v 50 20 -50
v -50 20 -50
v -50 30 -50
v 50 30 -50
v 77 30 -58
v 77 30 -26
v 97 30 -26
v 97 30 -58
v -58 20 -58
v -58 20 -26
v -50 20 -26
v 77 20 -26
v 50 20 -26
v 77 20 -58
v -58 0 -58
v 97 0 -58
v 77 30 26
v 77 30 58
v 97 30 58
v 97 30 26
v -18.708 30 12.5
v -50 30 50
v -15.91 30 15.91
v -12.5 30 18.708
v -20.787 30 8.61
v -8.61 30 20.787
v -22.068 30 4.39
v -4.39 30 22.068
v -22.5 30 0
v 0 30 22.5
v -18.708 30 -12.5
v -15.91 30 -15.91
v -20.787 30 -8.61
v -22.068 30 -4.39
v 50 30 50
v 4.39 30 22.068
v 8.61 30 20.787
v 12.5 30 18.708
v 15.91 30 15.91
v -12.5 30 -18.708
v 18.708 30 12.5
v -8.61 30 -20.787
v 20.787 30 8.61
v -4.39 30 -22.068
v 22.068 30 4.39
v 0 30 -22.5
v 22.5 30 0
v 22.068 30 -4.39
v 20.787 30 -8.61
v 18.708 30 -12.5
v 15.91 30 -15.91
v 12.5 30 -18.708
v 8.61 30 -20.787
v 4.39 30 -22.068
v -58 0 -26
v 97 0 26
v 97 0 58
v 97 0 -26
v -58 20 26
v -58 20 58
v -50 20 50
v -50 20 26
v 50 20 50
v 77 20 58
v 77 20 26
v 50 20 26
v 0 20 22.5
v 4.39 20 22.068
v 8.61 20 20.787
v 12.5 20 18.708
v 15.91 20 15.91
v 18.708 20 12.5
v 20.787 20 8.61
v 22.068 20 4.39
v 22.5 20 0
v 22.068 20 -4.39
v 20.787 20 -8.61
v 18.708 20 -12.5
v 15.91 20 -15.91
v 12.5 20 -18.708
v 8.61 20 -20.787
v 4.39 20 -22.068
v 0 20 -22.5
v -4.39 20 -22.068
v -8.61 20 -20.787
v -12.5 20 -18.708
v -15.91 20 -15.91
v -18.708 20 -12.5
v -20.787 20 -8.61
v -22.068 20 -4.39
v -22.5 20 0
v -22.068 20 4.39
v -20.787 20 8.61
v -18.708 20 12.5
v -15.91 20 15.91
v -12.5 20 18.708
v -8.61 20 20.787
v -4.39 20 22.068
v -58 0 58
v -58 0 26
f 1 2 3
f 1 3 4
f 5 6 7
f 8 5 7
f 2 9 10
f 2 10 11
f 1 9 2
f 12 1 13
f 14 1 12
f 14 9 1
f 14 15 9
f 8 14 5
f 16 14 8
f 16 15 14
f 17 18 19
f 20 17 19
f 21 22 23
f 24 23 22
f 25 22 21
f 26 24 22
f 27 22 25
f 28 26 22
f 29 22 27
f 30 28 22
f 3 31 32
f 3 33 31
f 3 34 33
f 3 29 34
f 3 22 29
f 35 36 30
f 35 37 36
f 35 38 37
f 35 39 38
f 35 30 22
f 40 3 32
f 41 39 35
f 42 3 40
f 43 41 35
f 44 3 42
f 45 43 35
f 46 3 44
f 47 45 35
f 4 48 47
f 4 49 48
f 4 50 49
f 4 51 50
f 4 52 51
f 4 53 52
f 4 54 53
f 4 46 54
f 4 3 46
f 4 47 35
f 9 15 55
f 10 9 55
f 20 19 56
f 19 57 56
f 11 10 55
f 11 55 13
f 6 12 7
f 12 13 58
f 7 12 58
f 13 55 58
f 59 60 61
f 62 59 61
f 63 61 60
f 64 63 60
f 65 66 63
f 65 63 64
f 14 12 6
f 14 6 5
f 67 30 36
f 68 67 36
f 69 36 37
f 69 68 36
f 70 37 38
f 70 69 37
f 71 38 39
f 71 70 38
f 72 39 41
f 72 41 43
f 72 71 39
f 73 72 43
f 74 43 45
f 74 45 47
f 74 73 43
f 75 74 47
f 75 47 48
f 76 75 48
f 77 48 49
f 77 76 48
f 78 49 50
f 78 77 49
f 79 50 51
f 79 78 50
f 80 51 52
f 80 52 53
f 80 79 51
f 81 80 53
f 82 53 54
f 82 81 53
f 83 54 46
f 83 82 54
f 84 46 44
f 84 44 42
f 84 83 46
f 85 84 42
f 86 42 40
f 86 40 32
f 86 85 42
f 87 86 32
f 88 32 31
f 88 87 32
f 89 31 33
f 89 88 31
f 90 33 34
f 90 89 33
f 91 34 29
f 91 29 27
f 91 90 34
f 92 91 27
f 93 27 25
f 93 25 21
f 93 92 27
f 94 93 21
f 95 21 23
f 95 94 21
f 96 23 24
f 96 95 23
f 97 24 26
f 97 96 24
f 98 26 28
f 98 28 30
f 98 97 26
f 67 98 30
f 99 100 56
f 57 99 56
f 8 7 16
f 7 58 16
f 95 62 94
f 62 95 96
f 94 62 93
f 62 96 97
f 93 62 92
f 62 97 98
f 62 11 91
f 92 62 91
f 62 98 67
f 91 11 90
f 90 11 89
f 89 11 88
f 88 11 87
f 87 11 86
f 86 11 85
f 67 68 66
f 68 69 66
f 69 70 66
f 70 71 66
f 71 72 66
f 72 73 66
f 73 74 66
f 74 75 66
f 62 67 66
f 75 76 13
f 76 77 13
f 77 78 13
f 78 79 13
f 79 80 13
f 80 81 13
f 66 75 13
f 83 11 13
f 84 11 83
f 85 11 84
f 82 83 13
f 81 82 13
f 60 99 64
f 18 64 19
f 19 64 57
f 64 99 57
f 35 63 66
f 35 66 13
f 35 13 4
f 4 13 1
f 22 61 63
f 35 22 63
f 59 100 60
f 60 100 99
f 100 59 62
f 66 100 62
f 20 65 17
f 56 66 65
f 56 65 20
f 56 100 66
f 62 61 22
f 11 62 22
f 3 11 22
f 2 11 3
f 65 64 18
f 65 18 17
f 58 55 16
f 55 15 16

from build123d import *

# Parameters (mm, degrees)
SKETCH1_W           = 20
SKETCH1_H           = 32
SKETCH1_W_2         = 100
SKETCH1_H_2         = 24
BOSS_EXTRUDE1_DEPTH = 20
BOSS_EXTRUDE2_START = 20
SKETCH1_3_W         = 20
SKETCH1_3_H         = 32
BOSS_EXTRUDE2_DEPTH = 10
BOSS_EXTRUDE3_START = 20
SKETCH1_5_W         = 100
SKETCH1_5_H         = 24
SKETCH1_5_H_2       = 52
SKETCH1_5_R         = 22.5
BOSS_EXTRUDE3_DEPTH = 10


with BuildPart() as part:
    # Sketch1 → Boss-Extrude1 (new body)
    with BuildSketch(Plane(origin=(0, 0, 0), x_dir=(1, 0, 0), z_dir=(0, 1, 0))):
        Polygon((50, -50), (-50, -50), (-50, -26), (-58, -26), (-58, -58), (77, -58), (77, -26), (50, -26), align=None)
        Polygon((-58, 26), (-50, 26), (-50, 50), (50, 50), (50, 26), (77, 26), (77, 58), (-58, 58), align=None)
        with Locations((87, -42)):
            Rectangle(SKETCH1_W, SKETCH1_H)
        with Locations((87, 42)):
            Rectangle(SKETCH1_W, SKETCH1_H)
        with Locations((0, -38)):
            Rectangle(SKETCH1_W_2, SKETCH1_H_2)
        with Locations((0, 38)):
            Rectangle(SKETCH1_W_2, SKETCH1_H_2)
    extrude(amount=BOSS_EXTRUDE1_DEPTH)

    # Sketch1<3> → Boss-Extrude2 (add)
    with BuildSketch(Plane(origin=(0, 0, 0), x_dir=(1, 0, 0), z_dir=(0, 1, 0)).offset(BOSS_EXTRUDE2_START)):
        with Locations((87, -42)):
            Rectangle(SKETCH1_3_W, SKETCH1_3_H)
        with Locations((87, 42)):
            Rectangle(SKETCH1_3_W, SKETCH1_3_H)
    extrude(amount=BOSS_EXTRUDE2_DEPTH)

    # Sketch1<5> → Boss-Extrude3 (add)
    # profile 1 of 3: a face of its own
    with BuildSketch(Plane(origin=(0, 0, 0), x_dir=(1, 0, 0), z_dir=(0, 1, 0)).offset(BOSS_EXTRUDE3_START)):
        with Locations((0, -38)):
            Rectangle(SKETCH1_5_W, SKETCH1_5_H)
    # profile 2 of 3: a face of its own
    with BuildSketch(Plane(origin=(0, 0, 0), x_dir=(1, 0, 0), z_dir=(0, 1, 0)).offset(BOSS_EXTRUDE3_START)):
        Rectangle(SKETCH1_5_W, SKETCH1_5_H_2)
        with Locations(Location((0, 0, 0), (0, 0, 270))):
            Circle(SKETCH1_5_R, mode=Mode.SUBTRACT)
    # profile 3 of 3: a face of its own
    with BuildSketch(Plane(origin=(0, 0, 0), x_dir=(1, 0, 0), z_dir=(0, 1, 0)).offset(BOSS_EXTRUDE3_START)):
        with Locations((0, 38)):
            Rectangle(SKETCH1_5_W, SKETCH1_5_H)
    extrude(amount=BOSS_EXTRUDE3_DEPTH)


solid = part.part
